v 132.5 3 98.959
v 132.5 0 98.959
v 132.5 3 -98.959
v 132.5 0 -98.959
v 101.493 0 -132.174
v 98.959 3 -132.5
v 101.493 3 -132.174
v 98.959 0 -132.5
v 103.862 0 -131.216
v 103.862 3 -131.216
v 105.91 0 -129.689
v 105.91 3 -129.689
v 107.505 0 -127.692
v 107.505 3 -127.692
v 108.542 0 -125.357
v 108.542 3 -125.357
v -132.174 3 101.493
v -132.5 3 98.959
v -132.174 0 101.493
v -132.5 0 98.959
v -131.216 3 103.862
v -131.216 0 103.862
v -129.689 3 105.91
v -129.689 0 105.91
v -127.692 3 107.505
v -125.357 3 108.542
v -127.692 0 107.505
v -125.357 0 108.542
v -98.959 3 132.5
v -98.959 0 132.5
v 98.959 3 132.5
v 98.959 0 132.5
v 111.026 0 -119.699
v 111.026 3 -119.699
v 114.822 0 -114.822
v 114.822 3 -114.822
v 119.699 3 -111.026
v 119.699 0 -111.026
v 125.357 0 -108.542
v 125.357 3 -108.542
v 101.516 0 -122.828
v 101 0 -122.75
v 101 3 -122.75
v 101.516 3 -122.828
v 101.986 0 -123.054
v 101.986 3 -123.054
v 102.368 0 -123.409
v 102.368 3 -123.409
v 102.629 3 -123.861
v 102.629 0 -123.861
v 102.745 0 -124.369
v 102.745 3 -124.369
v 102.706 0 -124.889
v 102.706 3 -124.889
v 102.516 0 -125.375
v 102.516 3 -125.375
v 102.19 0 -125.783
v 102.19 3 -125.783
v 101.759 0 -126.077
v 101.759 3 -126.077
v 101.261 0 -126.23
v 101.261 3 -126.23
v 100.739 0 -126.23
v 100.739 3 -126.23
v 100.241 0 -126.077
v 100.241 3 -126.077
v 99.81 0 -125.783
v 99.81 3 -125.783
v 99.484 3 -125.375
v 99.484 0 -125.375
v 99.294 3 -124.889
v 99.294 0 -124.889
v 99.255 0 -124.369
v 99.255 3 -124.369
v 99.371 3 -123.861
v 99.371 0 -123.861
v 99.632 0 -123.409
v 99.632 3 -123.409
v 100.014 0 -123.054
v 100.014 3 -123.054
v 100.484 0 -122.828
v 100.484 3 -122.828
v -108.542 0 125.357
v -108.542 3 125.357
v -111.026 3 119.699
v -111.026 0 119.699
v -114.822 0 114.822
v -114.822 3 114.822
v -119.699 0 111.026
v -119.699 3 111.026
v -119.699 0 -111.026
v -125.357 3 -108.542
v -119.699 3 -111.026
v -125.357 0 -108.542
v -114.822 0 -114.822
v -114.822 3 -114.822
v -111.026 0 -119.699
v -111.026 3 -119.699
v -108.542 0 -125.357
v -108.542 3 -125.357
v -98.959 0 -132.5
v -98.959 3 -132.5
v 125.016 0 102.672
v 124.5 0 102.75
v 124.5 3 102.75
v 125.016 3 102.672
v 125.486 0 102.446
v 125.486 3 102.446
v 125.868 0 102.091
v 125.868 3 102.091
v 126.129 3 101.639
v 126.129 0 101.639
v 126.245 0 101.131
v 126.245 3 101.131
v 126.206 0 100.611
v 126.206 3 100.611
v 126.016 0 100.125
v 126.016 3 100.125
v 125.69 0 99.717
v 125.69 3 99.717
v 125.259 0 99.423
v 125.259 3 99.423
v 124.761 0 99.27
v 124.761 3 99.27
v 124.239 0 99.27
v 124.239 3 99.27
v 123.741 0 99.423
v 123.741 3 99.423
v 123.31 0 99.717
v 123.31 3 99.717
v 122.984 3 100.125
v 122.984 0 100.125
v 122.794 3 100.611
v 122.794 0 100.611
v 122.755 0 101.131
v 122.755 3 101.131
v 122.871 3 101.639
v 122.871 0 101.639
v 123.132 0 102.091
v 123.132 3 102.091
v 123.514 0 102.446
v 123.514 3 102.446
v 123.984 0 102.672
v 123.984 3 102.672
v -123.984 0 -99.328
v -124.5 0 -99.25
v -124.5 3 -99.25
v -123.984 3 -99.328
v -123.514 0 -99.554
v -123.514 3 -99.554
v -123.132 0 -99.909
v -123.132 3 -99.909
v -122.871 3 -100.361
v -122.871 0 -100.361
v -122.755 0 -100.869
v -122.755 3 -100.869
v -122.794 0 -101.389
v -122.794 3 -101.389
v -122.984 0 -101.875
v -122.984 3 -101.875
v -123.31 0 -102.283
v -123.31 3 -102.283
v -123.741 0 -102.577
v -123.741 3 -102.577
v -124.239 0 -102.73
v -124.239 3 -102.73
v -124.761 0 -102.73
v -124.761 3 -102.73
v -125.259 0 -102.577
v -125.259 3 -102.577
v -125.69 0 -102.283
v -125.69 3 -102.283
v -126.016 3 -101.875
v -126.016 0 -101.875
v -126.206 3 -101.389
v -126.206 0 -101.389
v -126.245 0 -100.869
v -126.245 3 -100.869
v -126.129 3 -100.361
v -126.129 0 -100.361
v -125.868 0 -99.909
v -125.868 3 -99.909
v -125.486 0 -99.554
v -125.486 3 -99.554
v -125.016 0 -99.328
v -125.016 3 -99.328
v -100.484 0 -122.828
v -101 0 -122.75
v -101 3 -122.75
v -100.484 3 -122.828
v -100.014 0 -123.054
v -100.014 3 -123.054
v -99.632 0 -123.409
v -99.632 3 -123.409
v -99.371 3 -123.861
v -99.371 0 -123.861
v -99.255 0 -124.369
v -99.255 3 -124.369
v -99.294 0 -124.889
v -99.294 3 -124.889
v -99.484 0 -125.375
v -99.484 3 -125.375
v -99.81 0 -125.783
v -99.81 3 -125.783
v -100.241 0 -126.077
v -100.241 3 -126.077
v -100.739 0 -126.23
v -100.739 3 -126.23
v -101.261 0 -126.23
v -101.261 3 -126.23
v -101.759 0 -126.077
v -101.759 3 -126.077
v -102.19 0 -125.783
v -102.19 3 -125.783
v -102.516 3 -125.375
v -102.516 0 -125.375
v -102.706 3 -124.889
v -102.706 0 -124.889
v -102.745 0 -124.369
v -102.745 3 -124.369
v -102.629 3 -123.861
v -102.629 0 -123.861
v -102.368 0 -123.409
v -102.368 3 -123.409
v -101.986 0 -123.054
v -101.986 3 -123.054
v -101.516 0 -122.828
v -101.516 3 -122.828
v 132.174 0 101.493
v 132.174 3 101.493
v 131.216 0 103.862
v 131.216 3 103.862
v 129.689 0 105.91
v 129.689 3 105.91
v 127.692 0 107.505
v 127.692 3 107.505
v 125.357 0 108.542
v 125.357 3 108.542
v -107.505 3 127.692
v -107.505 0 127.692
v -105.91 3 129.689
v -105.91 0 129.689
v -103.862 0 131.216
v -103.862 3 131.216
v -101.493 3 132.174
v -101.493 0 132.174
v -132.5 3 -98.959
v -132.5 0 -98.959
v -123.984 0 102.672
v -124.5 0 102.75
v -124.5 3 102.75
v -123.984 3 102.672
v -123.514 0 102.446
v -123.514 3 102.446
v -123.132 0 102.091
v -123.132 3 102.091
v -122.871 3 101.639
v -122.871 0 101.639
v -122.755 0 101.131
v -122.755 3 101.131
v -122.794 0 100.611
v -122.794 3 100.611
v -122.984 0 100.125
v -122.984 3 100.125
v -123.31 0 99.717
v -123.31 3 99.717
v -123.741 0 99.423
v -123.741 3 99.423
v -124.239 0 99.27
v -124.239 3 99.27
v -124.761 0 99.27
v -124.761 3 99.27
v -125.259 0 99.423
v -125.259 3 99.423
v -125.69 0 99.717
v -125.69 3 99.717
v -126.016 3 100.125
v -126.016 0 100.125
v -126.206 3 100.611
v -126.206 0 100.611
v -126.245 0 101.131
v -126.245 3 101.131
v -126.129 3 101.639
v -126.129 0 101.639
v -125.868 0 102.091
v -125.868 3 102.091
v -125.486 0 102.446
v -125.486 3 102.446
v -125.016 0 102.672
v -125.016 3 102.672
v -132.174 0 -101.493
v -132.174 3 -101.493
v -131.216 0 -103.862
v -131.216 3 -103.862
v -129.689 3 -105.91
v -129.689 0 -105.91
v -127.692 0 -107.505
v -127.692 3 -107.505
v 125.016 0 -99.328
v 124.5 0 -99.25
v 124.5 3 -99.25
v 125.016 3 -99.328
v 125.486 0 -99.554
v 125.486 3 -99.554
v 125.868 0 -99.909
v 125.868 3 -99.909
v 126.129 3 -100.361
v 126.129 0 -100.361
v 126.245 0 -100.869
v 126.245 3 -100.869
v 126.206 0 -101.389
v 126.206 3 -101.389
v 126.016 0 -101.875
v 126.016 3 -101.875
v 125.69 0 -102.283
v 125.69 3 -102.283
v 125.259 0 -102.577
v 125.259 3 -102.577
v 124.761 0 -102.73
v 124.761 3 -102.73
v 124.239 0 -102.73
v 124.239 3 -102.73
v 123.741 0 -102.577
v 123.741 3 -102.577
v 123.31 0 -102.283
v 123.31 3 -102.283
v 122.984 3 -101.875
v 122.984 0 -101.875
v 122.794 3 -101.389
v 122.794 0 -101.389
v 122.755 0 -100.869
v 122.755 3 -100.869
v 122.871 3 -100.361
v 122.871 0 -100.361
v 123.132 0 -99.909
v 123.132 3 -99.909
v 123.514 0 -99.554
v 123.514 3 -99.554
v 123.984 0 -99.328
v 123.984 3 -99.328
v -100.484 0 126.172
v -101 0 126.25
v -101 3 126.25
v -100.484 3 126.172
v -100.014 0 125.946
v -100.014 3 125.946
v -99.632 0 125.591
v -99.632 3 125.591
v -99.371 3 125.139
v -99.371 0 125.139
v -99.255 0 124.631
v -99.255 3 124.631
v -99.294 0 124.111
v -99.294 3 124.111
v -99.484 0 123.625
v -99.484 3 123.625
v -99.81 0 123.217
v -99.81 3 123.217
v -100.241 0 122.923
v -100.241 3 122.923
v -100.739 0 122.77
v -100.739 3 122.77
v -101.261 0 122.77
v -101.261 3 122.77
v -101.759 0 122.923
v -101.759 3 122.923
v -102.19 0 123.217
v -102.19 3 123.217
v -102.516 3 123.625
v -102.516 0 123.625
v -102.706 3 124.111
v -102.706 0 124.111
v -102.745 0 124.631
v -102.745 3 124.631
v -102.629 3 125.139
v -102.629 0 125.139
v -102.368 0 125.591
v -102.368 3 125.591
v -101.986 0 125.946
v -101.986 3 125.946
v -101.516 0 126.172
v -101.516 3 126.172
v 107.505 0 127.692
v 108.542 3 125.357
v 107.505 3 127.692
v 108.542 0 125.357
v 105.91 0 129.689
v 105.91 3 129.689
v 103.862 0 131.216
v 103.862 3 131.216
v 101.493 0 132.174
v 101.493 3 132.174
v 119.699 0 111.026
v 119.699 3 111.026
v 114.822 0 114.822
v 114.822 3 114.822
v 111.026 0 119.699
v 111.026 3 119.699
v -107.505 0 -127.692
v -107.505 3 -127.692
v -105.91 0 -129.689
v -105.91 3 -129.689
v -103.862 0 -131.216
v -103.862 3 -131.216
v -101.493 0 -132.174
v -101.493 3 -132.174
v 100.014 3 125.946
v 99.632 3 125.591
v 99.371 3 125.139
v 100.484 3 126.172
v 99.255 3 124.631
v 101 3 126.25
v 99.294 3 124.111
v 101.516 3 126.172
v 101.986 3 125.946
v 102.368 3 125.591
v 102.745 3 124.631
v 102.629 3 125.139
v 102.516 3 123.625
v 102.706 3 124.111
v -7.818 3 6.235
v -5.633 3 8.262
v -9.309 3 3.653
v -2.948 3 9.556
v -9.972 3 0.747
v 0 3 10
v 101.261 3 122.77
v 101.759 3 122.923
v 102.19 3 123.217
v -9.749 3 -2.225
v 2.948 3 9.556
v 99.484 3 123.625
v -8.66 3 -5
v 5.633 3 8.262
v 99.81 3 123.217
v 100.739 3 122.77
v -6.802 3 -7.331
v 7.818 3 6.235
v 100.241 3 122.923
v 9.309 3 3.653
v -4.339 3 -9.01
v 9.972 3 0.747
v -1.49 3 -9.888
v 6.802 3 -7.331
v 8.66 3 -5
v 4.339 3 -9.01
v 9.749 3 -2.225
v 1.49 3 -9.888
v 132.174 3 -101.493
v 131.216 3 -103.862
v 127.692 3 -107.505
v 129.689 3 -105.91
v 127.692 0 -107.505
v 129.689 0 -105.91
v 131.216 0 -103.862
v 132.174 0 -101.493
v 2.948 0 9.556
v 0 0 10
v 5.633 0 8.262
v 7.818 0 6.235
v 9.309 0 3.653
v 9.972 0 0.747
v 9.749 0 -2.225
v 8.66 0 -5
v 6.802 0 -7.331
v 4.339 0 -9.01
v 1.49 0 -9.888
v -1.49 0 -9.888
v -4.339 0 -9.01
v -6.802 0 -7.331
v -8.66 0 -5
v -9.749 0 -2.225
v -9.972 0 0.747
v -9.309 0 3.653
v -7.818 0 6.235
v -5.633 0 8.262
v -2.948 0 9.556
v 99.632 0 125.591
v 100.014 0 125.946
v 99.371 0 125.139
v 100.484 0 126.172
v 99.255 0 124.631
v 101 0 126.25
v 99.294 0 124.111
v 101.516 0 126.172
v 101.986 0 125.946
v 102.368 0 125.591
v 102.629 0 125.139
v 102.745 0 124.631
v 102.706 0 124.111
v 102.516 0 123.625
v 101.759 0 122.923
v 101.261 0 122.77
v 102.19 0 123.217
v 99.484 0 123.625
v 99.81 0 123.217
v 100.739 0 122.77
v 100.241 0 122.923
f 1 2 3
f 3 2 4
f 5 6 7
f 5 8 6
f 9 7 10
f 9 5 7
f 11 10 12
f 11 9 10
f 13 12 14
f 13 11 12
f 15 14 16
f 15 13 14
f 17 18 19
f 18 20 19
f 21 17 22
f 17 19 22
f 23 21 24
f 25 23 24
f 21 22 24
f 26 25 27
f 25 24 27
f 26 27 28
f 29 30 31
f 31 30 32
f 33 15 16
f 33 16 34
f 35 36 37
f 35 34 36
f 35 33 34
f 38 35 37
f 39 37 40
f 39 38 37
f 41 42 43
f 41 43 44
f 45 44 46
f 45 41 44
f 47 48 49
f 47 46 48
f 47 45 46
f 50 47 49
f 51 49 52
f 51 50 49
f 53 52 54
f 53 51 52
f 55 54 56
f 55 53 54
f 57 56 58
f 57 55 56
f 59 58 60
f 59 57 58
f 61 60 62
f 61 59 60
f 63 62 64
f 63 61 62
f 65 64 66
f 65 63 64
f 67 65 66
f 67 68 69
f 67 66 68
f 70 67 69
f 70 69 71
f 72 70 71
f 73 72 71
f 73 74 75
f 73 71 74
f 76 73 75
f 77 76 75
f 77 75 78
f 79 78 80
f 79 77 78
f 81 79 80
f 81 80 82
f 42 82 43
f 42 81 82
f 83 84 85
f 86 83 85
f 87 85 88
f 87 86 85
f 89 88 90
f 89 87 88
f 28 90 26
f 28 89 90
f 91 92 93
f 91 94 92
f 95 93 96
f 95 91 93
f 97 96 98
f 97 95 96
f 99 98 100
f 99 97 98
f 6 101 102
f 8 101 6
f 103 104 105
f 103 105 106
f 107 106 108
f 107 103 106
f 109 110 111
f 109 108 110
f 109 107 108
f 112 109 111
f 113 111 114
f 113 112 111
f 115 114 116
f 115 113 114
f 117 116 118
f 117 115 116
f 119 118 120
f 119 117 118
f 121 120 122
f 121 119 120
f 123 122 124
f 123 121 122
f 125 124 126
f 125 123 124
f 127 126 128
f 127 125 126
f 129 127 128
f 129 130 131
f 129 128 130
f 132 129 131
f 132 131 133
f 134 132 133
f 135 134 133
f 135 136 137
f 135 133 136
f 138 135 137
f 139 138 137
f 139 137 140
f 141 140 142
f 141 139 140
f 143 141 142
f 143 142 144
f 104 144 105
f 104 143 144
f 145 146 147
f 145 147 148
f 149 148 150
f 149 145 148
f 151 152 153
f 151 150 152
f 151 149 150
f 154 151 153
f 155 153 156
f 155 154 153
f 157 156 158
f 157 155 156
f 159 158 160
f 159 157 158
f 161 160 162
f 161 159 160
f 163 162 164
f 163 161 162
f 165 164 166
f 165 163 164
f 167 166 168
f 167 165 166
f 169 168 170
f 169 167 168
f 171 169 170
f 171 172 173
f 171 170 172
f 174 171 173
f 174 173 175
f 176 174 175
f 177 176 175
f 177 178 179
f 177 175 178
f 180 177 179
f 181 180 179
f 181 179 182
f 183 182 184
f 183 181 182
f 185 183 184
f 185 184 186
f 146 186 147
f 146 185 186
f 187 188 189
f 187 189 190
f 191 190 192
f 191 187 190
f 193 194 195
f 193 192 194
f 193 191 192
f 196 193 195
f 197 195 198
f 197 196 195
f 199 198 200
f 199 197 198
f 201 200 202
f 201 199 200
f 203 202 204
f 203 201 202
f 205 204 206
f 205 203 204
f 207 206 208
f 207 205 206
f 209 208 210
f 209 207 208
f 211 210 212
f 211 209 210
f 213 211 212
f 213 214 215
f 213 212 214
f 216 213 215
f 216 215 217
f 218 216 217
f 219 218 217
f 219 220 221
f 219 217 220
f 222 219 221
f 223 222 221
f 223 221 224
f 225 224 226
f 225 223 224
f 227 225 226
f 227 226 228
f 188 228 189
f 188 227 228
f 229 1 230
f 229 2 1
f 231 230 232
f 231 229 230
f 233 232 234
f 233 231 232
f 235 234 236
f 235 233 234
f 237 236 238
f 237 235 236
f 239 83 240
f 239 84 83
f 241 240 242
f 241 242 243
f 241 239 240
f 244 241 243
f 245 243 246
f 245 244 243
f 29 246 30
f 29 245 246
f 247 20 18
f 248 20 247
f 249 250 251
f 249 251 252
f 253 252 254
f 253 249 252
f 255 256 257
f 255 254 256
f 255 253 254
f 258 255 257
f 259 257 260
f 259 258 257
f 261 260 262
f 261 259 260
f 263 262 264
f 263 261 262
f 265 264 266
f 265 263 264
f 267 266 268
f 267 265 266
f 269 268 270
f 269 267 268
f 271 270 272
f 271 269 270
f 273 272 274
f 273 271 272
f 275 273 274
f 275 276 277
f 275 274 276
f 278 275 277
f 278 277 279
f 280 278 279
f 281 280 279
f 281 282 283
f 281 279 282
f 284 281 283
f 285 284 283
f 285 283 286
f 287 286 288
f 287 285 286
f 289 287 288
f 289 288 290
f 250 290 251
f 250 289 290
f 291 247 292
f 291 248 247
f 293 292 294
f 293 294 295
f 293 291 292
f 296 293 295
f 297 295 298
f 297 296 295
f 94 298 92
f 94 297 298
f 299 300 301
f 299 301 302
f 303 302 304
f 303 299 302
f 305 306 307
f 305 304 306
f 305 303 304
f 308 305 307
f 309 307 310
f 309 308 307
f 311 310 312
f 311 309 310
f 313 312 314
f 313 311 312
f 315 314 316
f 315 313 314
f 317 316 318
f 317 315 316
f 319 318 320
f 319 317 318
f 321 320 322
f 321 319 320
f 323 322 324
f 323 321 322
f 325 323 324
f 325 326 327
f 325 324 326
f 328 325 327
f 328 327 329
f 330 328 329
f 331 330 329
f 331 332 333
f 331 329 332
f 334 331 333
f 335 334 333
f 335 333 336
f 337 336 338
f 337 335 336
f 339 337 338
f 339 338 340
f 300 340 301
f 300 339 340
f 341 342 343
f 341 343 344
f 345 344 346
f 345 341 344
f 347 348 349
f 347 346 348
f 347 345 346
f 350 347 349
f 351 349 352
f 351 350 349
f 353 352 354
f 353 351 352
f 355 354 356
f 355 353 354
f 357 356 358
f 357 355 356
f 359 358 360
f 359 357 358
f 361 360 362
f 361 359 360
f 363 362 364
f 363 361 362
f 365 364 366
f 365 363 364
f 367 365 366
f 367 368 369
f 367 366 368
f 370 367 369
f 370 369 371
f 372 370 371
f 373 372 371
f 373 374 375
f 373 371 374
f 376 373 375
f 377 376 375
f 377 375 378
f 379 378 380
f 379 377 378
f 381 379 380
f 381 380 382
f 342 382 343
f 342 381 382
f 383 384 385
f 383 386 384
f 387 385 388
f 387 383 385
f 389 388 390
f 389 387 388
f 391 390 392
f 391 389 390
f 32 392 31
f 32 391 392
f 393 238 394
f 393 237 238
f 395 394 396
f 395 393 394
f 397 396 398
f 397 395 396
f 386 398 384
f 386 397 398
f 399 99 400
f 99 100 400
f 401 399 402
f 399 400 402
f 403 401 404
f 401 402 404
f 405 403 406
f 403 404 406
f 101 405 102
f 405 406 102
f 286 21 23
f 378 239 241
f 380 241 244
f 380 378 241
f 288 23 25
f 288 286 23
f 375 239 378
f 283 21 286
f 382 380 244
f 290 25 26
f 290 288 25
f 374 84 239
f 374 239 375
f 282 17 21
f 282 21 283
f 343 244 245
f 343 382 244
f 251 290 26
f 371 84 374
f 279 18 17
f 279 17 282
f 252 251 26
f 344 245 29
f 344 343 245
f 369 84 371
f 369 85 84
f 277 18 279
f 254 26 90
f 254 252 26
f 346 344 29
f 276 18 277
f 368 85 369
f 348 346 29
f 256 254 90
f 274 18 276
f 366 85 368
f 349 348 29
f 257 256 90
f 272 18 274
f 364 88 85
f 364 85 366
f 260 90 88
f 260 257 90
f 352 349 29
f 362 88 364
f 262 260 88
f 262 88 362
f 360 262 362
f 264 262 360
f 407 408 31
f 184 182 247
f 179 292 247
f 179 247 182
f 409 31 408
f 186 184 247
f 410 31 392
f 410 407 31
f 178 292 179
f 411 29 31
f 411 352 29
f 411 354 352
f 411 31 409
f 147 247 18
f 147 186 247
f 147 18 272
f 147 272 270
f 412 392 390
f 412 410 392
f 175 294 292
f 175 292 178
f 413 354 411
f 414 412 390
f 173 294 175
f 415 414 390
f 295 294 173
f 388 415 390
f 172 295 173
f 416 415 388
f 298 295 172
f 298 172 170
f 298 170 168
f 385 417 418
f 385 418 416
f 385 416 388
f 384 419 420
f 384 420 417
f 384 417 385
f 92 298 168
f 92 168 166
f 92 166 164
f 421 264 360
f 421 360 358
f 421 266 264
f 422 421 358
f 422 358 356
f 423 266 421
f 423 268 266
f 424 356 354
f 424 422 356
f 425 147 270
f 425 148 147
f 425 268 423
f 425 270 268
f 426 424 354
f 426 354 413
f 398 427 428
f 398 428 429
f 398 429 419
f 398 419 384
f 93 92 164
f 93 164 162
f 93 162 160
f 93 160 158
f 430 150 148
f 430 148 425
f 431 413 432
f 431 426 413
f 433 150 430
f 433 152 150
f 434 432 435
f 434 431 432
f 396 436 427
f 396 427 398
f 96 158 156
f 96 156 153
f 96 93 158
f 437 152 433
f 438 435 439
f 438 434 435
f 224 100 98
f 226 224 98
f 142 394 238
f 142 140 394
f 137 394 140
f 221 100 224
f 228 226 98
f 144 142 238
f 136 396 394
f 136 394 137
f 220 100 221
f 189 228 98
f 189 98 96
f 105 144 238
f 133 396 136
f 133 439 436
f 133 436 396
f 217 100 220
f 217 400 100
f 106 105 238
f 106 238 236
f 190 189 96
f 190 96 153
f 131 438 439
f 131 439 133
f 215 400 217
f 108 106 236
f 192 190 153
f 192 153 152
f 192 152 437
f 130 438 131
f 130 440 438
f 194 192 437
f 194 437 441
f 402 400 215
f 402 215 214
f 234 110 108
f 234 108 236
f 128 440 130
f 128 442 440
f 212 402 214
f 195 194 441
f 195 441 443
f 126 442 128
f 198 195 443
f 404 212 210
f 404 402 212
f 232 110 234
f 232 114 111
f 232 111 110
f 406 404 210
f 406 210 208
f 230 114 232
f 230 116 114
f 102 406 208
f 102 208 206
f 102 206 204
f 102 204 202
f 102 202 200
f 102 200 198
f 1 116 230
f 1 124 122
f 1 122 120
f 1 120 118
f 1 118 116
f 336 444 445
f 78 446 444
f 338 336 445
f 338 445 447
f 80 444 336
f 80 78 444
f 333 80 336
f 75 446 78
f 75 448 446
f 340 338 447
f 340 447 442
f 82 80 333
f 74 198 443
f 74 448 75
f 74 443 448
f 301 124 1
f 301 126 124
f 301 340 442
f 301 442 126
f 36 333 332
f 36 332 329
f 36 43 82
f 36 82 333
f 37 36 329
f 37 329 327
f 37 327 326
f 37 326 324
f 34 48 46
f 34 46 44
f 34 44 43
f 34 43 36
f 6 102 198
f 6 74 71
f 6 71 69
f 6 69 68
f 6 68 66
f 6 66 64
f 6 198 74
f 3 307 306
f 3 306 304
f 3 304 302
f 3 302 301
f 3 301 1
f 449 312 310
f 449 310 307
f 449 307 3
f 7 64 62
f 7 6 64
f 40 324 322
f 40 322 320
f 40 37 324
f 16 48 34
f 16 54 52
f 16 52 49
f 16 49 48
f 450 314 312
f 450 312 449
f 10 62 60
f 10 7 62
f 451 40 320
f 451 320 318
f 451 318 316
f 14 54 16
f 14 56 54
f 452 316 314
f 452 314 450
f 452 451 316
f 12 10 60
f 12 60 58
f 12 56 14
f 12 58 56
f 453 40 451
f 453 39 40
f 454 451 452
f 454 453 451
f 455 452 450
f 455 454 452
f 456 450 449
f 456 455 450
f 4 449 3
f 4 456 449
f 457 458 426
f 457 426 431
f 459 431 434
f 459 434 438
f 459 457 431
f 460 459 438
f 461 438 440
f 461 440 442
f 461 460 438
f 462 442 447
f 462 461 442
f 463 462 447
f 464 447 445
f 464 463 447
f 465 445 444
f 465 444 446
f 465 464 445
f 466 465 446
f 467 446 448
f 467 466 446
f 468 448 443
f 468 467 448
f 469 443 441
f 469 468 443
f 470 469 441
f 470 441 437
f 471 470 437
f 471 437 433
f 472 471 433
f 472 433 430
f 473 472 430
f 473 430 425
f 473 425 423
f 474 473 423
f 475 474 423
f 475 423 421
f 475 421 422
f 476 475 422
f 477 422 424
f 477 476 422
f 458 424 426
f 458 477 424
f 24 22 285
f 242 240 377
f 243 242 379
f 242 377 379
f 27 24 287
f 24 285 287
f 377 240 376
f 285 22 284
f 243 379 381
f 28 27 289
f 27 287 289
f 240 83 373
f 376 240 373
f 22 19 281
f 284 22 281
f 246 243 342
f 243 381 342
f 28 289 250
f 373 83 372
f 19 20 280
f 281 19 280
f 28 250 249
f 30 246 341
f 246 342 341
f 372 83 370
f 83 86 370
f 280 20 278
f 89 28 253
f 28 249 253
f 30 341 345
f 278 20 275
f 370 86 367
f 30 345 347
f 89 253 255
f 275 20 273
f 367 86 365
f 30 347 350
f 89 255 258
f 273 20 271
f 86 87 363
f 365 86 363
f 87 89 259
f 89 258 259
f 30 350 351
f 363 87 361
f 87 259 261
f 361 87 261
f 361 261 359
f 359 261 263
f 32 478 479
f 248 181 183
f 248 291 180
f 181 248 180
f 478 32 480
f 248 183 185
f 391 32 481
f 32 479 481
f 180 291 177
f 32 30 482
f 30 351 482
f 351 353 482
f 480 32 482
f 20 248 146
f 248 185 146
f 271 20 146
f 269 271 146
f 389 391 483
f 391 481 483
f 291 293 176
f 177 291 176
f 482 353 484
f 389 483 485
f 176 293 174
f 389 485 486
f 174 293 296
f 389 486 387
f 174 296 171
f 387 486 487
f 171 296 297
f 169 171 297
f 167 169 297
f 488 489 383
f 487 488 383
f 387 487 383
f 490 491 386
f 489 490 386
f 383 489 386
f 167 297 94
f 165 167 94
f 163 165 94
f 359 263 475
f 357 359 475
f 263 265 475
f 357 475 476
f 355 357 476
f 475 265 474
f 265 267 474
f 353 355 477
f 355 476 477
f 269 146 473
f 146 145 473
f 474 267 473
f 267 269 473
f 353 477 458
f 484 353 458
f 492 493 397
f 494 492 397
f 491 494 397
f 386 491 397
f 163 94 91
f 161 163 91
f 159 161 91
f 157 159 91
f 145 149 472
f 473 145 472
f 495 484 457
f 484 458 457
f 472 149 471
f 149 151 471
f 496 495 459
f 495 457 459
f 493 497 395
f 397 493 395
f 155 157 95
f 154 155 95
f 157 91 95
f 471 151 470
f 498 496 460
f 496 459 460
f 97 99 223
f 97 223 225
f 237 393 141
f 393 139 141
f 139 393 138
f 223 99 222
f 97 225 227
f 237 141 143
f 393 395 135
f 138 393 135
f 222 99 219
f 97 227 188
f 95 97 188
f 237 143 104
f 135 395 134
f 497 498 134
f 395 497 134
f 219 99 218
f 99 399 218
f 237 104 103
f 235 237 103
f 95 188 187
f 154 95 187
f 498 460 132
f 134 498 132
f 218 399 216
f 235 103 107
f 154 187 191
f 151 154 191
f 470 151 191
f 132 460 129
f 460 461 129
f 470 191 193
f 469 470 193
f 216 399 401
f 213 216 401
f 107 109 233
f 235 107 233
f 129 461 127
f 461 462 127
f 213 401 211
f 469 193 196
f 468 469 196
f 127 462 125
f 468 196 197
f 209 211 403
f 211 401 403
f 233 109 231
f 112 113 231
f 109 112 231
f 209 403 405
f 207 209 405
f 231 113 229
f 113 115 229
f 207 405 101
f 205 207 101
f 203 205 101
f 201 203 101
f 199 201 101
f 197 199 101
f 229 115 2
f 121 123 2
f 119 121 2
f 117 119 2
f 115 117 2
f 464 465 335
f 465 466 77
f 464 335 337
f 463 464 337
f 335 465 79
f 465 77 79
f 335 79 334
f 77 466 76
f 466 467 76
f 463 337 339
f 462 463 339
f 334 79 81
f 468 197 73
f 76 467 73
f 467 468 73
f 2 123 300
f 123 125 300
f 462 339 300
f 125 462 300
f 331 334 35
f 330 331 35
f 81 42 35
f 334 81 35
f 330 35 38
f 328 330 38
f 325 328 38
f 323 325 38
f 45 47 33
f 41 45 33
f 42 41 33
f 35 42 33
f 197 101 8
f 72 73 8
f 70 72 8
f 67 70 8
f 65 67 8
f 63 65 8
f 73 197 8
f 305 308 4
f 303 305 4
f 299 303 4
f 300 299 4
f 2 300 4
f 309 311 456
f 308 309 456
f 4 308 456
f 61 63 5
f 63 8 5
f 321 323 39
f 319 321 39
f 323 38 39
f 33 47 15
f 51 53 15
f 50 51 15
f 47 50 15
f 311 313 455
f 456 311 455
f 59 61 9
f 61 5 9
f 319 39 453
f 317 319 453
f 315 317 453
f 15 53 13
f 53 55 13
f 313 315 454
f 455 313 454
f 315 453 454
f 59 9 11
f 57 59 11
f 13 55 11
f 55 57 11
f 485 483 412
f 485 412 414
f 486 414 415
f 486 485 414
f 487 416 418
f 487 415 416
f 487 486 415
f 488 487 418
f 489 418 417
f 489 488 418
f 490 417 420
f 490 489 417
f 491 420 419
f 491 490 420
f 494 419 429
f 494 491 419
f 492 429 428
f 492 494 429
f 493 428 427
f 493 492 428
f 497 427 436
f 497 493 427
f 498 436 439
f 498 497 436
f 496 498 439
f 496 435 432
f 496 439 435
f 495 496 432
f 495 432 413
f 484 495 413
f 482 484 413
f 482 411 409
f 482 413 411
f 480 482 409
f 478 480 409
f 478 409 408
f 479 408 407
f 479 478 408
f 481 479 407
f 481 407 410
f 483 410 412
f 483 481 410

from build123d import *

# Parameters (mm, degrees)
SKETCH_2_W               = 265
SKETCH_2_H               = 265
SKETCH_2_R               = 10
EXTRUDE_585_DEPTH        = 3
CUT_EXTRUDE_2_DEPTH      = 188.407310423
CUT_EXTRUDE_2_DEPTH_BACK = 188.407310423
SKETCH_3_R               = 25
SKETCH_3_R_2             = 1.75
FILLET_2_R               = 10


with BuildPart() as part:
    # 草图2 → Extrude 585 (new body)
    with BuildSketch(Plane(origin=(0, 0, 0), x_dir=(1, 0, 0), z_dir=(0, 1, 0))):
        Rectangle(SKETCH_2_W, SKETCH_2_H)
        with Locations(Location((0, 0, 0), (0, 0, 270))):
            Circle(SKETCH_2_R, mode=Mode.SUBTRACT)
    extrude(amount=EXTRUDE_585_DEPTH)

    # 草图3 → 切除-拉伸2 (cut, two sides: drawn at the far end of the back side and taken through both)
    with BuildSketch(Plane(origin=(0, 3, 0), x_dir=(1, 0, 0), z_dir=(0, 1, 0)).offset(-CUT_EXTRUDE_2_DEPTH_BACK)):
        with Locations((-132.5, -132.5)):
            Circle(SKETCH_3_R)
        with Locations((-132.5, 132.5)):
            Circle(SKETCH_3_R)
        with Locations(Location((-124.5, 101, 0), (0, 0, 270))):
            Circle(SKETCH_3_R_2)
        with Locations(Location((-101, 124.5, 0), (0, 0, 270))):
            Circle(SKETCH_3_R_2)
        with Locations(Location((-124.5, -101, 0), (0, 0, 270))):
            Circle(SKETCH_3_R_2)
        with Locations(Location((-101, -124.5, 0), (0, 0, 270))):
            Circle(SKETCH_3_R_2)
        with Locations((132.5, 132.5)):
            Circle(SKETCH_3_R)
        with Locations(Location((101, 124.5, 0), (0, 0, 270))):
            Circle(SKETCH_3_R_2)
        with Locations(Location((124.5, 101, 0), (0, 0, 270))):
            Circle(SKETCH_3_R_2)
        with Locations((132.5, -132.5)):
            Circle(SKETCH_3_R)
        with Locations(Location((124.5, -101, 0), (0, 0, 270))):
            Circle(SKETCH_3_R_2)
        with Locations(Location((101, -124.5, 0), (0, 0, 270))):
            Circle(SKETCH_3_R_2)
    extrude(amount=CUT_EXTRUDE_2_DEPTH + CUT_EXTRUDE_2_DEPTH_BACK, mode=Mode.SUBTRACT)

    # 圆角2
    fillet_2_edges = [part.edges().sort_by_distance(p)[0] for p in [
        (132.5, 1.5, -107.5),
        (107.5, 1.5, -132.5),
        (-107.5, 1.5, -132.5),
        (-132.5, 1.5, -107.5),
        (107.5, 1.5, 132.5),
        (132.5, 1.5, 107.5),
        (-107.5, 1.5, 132.5),
        (-132.5, 1.5, 107.5),
    ]]
    fillet(fillet_2_edges, radius=FILLET_2_R)


solid = part.part
